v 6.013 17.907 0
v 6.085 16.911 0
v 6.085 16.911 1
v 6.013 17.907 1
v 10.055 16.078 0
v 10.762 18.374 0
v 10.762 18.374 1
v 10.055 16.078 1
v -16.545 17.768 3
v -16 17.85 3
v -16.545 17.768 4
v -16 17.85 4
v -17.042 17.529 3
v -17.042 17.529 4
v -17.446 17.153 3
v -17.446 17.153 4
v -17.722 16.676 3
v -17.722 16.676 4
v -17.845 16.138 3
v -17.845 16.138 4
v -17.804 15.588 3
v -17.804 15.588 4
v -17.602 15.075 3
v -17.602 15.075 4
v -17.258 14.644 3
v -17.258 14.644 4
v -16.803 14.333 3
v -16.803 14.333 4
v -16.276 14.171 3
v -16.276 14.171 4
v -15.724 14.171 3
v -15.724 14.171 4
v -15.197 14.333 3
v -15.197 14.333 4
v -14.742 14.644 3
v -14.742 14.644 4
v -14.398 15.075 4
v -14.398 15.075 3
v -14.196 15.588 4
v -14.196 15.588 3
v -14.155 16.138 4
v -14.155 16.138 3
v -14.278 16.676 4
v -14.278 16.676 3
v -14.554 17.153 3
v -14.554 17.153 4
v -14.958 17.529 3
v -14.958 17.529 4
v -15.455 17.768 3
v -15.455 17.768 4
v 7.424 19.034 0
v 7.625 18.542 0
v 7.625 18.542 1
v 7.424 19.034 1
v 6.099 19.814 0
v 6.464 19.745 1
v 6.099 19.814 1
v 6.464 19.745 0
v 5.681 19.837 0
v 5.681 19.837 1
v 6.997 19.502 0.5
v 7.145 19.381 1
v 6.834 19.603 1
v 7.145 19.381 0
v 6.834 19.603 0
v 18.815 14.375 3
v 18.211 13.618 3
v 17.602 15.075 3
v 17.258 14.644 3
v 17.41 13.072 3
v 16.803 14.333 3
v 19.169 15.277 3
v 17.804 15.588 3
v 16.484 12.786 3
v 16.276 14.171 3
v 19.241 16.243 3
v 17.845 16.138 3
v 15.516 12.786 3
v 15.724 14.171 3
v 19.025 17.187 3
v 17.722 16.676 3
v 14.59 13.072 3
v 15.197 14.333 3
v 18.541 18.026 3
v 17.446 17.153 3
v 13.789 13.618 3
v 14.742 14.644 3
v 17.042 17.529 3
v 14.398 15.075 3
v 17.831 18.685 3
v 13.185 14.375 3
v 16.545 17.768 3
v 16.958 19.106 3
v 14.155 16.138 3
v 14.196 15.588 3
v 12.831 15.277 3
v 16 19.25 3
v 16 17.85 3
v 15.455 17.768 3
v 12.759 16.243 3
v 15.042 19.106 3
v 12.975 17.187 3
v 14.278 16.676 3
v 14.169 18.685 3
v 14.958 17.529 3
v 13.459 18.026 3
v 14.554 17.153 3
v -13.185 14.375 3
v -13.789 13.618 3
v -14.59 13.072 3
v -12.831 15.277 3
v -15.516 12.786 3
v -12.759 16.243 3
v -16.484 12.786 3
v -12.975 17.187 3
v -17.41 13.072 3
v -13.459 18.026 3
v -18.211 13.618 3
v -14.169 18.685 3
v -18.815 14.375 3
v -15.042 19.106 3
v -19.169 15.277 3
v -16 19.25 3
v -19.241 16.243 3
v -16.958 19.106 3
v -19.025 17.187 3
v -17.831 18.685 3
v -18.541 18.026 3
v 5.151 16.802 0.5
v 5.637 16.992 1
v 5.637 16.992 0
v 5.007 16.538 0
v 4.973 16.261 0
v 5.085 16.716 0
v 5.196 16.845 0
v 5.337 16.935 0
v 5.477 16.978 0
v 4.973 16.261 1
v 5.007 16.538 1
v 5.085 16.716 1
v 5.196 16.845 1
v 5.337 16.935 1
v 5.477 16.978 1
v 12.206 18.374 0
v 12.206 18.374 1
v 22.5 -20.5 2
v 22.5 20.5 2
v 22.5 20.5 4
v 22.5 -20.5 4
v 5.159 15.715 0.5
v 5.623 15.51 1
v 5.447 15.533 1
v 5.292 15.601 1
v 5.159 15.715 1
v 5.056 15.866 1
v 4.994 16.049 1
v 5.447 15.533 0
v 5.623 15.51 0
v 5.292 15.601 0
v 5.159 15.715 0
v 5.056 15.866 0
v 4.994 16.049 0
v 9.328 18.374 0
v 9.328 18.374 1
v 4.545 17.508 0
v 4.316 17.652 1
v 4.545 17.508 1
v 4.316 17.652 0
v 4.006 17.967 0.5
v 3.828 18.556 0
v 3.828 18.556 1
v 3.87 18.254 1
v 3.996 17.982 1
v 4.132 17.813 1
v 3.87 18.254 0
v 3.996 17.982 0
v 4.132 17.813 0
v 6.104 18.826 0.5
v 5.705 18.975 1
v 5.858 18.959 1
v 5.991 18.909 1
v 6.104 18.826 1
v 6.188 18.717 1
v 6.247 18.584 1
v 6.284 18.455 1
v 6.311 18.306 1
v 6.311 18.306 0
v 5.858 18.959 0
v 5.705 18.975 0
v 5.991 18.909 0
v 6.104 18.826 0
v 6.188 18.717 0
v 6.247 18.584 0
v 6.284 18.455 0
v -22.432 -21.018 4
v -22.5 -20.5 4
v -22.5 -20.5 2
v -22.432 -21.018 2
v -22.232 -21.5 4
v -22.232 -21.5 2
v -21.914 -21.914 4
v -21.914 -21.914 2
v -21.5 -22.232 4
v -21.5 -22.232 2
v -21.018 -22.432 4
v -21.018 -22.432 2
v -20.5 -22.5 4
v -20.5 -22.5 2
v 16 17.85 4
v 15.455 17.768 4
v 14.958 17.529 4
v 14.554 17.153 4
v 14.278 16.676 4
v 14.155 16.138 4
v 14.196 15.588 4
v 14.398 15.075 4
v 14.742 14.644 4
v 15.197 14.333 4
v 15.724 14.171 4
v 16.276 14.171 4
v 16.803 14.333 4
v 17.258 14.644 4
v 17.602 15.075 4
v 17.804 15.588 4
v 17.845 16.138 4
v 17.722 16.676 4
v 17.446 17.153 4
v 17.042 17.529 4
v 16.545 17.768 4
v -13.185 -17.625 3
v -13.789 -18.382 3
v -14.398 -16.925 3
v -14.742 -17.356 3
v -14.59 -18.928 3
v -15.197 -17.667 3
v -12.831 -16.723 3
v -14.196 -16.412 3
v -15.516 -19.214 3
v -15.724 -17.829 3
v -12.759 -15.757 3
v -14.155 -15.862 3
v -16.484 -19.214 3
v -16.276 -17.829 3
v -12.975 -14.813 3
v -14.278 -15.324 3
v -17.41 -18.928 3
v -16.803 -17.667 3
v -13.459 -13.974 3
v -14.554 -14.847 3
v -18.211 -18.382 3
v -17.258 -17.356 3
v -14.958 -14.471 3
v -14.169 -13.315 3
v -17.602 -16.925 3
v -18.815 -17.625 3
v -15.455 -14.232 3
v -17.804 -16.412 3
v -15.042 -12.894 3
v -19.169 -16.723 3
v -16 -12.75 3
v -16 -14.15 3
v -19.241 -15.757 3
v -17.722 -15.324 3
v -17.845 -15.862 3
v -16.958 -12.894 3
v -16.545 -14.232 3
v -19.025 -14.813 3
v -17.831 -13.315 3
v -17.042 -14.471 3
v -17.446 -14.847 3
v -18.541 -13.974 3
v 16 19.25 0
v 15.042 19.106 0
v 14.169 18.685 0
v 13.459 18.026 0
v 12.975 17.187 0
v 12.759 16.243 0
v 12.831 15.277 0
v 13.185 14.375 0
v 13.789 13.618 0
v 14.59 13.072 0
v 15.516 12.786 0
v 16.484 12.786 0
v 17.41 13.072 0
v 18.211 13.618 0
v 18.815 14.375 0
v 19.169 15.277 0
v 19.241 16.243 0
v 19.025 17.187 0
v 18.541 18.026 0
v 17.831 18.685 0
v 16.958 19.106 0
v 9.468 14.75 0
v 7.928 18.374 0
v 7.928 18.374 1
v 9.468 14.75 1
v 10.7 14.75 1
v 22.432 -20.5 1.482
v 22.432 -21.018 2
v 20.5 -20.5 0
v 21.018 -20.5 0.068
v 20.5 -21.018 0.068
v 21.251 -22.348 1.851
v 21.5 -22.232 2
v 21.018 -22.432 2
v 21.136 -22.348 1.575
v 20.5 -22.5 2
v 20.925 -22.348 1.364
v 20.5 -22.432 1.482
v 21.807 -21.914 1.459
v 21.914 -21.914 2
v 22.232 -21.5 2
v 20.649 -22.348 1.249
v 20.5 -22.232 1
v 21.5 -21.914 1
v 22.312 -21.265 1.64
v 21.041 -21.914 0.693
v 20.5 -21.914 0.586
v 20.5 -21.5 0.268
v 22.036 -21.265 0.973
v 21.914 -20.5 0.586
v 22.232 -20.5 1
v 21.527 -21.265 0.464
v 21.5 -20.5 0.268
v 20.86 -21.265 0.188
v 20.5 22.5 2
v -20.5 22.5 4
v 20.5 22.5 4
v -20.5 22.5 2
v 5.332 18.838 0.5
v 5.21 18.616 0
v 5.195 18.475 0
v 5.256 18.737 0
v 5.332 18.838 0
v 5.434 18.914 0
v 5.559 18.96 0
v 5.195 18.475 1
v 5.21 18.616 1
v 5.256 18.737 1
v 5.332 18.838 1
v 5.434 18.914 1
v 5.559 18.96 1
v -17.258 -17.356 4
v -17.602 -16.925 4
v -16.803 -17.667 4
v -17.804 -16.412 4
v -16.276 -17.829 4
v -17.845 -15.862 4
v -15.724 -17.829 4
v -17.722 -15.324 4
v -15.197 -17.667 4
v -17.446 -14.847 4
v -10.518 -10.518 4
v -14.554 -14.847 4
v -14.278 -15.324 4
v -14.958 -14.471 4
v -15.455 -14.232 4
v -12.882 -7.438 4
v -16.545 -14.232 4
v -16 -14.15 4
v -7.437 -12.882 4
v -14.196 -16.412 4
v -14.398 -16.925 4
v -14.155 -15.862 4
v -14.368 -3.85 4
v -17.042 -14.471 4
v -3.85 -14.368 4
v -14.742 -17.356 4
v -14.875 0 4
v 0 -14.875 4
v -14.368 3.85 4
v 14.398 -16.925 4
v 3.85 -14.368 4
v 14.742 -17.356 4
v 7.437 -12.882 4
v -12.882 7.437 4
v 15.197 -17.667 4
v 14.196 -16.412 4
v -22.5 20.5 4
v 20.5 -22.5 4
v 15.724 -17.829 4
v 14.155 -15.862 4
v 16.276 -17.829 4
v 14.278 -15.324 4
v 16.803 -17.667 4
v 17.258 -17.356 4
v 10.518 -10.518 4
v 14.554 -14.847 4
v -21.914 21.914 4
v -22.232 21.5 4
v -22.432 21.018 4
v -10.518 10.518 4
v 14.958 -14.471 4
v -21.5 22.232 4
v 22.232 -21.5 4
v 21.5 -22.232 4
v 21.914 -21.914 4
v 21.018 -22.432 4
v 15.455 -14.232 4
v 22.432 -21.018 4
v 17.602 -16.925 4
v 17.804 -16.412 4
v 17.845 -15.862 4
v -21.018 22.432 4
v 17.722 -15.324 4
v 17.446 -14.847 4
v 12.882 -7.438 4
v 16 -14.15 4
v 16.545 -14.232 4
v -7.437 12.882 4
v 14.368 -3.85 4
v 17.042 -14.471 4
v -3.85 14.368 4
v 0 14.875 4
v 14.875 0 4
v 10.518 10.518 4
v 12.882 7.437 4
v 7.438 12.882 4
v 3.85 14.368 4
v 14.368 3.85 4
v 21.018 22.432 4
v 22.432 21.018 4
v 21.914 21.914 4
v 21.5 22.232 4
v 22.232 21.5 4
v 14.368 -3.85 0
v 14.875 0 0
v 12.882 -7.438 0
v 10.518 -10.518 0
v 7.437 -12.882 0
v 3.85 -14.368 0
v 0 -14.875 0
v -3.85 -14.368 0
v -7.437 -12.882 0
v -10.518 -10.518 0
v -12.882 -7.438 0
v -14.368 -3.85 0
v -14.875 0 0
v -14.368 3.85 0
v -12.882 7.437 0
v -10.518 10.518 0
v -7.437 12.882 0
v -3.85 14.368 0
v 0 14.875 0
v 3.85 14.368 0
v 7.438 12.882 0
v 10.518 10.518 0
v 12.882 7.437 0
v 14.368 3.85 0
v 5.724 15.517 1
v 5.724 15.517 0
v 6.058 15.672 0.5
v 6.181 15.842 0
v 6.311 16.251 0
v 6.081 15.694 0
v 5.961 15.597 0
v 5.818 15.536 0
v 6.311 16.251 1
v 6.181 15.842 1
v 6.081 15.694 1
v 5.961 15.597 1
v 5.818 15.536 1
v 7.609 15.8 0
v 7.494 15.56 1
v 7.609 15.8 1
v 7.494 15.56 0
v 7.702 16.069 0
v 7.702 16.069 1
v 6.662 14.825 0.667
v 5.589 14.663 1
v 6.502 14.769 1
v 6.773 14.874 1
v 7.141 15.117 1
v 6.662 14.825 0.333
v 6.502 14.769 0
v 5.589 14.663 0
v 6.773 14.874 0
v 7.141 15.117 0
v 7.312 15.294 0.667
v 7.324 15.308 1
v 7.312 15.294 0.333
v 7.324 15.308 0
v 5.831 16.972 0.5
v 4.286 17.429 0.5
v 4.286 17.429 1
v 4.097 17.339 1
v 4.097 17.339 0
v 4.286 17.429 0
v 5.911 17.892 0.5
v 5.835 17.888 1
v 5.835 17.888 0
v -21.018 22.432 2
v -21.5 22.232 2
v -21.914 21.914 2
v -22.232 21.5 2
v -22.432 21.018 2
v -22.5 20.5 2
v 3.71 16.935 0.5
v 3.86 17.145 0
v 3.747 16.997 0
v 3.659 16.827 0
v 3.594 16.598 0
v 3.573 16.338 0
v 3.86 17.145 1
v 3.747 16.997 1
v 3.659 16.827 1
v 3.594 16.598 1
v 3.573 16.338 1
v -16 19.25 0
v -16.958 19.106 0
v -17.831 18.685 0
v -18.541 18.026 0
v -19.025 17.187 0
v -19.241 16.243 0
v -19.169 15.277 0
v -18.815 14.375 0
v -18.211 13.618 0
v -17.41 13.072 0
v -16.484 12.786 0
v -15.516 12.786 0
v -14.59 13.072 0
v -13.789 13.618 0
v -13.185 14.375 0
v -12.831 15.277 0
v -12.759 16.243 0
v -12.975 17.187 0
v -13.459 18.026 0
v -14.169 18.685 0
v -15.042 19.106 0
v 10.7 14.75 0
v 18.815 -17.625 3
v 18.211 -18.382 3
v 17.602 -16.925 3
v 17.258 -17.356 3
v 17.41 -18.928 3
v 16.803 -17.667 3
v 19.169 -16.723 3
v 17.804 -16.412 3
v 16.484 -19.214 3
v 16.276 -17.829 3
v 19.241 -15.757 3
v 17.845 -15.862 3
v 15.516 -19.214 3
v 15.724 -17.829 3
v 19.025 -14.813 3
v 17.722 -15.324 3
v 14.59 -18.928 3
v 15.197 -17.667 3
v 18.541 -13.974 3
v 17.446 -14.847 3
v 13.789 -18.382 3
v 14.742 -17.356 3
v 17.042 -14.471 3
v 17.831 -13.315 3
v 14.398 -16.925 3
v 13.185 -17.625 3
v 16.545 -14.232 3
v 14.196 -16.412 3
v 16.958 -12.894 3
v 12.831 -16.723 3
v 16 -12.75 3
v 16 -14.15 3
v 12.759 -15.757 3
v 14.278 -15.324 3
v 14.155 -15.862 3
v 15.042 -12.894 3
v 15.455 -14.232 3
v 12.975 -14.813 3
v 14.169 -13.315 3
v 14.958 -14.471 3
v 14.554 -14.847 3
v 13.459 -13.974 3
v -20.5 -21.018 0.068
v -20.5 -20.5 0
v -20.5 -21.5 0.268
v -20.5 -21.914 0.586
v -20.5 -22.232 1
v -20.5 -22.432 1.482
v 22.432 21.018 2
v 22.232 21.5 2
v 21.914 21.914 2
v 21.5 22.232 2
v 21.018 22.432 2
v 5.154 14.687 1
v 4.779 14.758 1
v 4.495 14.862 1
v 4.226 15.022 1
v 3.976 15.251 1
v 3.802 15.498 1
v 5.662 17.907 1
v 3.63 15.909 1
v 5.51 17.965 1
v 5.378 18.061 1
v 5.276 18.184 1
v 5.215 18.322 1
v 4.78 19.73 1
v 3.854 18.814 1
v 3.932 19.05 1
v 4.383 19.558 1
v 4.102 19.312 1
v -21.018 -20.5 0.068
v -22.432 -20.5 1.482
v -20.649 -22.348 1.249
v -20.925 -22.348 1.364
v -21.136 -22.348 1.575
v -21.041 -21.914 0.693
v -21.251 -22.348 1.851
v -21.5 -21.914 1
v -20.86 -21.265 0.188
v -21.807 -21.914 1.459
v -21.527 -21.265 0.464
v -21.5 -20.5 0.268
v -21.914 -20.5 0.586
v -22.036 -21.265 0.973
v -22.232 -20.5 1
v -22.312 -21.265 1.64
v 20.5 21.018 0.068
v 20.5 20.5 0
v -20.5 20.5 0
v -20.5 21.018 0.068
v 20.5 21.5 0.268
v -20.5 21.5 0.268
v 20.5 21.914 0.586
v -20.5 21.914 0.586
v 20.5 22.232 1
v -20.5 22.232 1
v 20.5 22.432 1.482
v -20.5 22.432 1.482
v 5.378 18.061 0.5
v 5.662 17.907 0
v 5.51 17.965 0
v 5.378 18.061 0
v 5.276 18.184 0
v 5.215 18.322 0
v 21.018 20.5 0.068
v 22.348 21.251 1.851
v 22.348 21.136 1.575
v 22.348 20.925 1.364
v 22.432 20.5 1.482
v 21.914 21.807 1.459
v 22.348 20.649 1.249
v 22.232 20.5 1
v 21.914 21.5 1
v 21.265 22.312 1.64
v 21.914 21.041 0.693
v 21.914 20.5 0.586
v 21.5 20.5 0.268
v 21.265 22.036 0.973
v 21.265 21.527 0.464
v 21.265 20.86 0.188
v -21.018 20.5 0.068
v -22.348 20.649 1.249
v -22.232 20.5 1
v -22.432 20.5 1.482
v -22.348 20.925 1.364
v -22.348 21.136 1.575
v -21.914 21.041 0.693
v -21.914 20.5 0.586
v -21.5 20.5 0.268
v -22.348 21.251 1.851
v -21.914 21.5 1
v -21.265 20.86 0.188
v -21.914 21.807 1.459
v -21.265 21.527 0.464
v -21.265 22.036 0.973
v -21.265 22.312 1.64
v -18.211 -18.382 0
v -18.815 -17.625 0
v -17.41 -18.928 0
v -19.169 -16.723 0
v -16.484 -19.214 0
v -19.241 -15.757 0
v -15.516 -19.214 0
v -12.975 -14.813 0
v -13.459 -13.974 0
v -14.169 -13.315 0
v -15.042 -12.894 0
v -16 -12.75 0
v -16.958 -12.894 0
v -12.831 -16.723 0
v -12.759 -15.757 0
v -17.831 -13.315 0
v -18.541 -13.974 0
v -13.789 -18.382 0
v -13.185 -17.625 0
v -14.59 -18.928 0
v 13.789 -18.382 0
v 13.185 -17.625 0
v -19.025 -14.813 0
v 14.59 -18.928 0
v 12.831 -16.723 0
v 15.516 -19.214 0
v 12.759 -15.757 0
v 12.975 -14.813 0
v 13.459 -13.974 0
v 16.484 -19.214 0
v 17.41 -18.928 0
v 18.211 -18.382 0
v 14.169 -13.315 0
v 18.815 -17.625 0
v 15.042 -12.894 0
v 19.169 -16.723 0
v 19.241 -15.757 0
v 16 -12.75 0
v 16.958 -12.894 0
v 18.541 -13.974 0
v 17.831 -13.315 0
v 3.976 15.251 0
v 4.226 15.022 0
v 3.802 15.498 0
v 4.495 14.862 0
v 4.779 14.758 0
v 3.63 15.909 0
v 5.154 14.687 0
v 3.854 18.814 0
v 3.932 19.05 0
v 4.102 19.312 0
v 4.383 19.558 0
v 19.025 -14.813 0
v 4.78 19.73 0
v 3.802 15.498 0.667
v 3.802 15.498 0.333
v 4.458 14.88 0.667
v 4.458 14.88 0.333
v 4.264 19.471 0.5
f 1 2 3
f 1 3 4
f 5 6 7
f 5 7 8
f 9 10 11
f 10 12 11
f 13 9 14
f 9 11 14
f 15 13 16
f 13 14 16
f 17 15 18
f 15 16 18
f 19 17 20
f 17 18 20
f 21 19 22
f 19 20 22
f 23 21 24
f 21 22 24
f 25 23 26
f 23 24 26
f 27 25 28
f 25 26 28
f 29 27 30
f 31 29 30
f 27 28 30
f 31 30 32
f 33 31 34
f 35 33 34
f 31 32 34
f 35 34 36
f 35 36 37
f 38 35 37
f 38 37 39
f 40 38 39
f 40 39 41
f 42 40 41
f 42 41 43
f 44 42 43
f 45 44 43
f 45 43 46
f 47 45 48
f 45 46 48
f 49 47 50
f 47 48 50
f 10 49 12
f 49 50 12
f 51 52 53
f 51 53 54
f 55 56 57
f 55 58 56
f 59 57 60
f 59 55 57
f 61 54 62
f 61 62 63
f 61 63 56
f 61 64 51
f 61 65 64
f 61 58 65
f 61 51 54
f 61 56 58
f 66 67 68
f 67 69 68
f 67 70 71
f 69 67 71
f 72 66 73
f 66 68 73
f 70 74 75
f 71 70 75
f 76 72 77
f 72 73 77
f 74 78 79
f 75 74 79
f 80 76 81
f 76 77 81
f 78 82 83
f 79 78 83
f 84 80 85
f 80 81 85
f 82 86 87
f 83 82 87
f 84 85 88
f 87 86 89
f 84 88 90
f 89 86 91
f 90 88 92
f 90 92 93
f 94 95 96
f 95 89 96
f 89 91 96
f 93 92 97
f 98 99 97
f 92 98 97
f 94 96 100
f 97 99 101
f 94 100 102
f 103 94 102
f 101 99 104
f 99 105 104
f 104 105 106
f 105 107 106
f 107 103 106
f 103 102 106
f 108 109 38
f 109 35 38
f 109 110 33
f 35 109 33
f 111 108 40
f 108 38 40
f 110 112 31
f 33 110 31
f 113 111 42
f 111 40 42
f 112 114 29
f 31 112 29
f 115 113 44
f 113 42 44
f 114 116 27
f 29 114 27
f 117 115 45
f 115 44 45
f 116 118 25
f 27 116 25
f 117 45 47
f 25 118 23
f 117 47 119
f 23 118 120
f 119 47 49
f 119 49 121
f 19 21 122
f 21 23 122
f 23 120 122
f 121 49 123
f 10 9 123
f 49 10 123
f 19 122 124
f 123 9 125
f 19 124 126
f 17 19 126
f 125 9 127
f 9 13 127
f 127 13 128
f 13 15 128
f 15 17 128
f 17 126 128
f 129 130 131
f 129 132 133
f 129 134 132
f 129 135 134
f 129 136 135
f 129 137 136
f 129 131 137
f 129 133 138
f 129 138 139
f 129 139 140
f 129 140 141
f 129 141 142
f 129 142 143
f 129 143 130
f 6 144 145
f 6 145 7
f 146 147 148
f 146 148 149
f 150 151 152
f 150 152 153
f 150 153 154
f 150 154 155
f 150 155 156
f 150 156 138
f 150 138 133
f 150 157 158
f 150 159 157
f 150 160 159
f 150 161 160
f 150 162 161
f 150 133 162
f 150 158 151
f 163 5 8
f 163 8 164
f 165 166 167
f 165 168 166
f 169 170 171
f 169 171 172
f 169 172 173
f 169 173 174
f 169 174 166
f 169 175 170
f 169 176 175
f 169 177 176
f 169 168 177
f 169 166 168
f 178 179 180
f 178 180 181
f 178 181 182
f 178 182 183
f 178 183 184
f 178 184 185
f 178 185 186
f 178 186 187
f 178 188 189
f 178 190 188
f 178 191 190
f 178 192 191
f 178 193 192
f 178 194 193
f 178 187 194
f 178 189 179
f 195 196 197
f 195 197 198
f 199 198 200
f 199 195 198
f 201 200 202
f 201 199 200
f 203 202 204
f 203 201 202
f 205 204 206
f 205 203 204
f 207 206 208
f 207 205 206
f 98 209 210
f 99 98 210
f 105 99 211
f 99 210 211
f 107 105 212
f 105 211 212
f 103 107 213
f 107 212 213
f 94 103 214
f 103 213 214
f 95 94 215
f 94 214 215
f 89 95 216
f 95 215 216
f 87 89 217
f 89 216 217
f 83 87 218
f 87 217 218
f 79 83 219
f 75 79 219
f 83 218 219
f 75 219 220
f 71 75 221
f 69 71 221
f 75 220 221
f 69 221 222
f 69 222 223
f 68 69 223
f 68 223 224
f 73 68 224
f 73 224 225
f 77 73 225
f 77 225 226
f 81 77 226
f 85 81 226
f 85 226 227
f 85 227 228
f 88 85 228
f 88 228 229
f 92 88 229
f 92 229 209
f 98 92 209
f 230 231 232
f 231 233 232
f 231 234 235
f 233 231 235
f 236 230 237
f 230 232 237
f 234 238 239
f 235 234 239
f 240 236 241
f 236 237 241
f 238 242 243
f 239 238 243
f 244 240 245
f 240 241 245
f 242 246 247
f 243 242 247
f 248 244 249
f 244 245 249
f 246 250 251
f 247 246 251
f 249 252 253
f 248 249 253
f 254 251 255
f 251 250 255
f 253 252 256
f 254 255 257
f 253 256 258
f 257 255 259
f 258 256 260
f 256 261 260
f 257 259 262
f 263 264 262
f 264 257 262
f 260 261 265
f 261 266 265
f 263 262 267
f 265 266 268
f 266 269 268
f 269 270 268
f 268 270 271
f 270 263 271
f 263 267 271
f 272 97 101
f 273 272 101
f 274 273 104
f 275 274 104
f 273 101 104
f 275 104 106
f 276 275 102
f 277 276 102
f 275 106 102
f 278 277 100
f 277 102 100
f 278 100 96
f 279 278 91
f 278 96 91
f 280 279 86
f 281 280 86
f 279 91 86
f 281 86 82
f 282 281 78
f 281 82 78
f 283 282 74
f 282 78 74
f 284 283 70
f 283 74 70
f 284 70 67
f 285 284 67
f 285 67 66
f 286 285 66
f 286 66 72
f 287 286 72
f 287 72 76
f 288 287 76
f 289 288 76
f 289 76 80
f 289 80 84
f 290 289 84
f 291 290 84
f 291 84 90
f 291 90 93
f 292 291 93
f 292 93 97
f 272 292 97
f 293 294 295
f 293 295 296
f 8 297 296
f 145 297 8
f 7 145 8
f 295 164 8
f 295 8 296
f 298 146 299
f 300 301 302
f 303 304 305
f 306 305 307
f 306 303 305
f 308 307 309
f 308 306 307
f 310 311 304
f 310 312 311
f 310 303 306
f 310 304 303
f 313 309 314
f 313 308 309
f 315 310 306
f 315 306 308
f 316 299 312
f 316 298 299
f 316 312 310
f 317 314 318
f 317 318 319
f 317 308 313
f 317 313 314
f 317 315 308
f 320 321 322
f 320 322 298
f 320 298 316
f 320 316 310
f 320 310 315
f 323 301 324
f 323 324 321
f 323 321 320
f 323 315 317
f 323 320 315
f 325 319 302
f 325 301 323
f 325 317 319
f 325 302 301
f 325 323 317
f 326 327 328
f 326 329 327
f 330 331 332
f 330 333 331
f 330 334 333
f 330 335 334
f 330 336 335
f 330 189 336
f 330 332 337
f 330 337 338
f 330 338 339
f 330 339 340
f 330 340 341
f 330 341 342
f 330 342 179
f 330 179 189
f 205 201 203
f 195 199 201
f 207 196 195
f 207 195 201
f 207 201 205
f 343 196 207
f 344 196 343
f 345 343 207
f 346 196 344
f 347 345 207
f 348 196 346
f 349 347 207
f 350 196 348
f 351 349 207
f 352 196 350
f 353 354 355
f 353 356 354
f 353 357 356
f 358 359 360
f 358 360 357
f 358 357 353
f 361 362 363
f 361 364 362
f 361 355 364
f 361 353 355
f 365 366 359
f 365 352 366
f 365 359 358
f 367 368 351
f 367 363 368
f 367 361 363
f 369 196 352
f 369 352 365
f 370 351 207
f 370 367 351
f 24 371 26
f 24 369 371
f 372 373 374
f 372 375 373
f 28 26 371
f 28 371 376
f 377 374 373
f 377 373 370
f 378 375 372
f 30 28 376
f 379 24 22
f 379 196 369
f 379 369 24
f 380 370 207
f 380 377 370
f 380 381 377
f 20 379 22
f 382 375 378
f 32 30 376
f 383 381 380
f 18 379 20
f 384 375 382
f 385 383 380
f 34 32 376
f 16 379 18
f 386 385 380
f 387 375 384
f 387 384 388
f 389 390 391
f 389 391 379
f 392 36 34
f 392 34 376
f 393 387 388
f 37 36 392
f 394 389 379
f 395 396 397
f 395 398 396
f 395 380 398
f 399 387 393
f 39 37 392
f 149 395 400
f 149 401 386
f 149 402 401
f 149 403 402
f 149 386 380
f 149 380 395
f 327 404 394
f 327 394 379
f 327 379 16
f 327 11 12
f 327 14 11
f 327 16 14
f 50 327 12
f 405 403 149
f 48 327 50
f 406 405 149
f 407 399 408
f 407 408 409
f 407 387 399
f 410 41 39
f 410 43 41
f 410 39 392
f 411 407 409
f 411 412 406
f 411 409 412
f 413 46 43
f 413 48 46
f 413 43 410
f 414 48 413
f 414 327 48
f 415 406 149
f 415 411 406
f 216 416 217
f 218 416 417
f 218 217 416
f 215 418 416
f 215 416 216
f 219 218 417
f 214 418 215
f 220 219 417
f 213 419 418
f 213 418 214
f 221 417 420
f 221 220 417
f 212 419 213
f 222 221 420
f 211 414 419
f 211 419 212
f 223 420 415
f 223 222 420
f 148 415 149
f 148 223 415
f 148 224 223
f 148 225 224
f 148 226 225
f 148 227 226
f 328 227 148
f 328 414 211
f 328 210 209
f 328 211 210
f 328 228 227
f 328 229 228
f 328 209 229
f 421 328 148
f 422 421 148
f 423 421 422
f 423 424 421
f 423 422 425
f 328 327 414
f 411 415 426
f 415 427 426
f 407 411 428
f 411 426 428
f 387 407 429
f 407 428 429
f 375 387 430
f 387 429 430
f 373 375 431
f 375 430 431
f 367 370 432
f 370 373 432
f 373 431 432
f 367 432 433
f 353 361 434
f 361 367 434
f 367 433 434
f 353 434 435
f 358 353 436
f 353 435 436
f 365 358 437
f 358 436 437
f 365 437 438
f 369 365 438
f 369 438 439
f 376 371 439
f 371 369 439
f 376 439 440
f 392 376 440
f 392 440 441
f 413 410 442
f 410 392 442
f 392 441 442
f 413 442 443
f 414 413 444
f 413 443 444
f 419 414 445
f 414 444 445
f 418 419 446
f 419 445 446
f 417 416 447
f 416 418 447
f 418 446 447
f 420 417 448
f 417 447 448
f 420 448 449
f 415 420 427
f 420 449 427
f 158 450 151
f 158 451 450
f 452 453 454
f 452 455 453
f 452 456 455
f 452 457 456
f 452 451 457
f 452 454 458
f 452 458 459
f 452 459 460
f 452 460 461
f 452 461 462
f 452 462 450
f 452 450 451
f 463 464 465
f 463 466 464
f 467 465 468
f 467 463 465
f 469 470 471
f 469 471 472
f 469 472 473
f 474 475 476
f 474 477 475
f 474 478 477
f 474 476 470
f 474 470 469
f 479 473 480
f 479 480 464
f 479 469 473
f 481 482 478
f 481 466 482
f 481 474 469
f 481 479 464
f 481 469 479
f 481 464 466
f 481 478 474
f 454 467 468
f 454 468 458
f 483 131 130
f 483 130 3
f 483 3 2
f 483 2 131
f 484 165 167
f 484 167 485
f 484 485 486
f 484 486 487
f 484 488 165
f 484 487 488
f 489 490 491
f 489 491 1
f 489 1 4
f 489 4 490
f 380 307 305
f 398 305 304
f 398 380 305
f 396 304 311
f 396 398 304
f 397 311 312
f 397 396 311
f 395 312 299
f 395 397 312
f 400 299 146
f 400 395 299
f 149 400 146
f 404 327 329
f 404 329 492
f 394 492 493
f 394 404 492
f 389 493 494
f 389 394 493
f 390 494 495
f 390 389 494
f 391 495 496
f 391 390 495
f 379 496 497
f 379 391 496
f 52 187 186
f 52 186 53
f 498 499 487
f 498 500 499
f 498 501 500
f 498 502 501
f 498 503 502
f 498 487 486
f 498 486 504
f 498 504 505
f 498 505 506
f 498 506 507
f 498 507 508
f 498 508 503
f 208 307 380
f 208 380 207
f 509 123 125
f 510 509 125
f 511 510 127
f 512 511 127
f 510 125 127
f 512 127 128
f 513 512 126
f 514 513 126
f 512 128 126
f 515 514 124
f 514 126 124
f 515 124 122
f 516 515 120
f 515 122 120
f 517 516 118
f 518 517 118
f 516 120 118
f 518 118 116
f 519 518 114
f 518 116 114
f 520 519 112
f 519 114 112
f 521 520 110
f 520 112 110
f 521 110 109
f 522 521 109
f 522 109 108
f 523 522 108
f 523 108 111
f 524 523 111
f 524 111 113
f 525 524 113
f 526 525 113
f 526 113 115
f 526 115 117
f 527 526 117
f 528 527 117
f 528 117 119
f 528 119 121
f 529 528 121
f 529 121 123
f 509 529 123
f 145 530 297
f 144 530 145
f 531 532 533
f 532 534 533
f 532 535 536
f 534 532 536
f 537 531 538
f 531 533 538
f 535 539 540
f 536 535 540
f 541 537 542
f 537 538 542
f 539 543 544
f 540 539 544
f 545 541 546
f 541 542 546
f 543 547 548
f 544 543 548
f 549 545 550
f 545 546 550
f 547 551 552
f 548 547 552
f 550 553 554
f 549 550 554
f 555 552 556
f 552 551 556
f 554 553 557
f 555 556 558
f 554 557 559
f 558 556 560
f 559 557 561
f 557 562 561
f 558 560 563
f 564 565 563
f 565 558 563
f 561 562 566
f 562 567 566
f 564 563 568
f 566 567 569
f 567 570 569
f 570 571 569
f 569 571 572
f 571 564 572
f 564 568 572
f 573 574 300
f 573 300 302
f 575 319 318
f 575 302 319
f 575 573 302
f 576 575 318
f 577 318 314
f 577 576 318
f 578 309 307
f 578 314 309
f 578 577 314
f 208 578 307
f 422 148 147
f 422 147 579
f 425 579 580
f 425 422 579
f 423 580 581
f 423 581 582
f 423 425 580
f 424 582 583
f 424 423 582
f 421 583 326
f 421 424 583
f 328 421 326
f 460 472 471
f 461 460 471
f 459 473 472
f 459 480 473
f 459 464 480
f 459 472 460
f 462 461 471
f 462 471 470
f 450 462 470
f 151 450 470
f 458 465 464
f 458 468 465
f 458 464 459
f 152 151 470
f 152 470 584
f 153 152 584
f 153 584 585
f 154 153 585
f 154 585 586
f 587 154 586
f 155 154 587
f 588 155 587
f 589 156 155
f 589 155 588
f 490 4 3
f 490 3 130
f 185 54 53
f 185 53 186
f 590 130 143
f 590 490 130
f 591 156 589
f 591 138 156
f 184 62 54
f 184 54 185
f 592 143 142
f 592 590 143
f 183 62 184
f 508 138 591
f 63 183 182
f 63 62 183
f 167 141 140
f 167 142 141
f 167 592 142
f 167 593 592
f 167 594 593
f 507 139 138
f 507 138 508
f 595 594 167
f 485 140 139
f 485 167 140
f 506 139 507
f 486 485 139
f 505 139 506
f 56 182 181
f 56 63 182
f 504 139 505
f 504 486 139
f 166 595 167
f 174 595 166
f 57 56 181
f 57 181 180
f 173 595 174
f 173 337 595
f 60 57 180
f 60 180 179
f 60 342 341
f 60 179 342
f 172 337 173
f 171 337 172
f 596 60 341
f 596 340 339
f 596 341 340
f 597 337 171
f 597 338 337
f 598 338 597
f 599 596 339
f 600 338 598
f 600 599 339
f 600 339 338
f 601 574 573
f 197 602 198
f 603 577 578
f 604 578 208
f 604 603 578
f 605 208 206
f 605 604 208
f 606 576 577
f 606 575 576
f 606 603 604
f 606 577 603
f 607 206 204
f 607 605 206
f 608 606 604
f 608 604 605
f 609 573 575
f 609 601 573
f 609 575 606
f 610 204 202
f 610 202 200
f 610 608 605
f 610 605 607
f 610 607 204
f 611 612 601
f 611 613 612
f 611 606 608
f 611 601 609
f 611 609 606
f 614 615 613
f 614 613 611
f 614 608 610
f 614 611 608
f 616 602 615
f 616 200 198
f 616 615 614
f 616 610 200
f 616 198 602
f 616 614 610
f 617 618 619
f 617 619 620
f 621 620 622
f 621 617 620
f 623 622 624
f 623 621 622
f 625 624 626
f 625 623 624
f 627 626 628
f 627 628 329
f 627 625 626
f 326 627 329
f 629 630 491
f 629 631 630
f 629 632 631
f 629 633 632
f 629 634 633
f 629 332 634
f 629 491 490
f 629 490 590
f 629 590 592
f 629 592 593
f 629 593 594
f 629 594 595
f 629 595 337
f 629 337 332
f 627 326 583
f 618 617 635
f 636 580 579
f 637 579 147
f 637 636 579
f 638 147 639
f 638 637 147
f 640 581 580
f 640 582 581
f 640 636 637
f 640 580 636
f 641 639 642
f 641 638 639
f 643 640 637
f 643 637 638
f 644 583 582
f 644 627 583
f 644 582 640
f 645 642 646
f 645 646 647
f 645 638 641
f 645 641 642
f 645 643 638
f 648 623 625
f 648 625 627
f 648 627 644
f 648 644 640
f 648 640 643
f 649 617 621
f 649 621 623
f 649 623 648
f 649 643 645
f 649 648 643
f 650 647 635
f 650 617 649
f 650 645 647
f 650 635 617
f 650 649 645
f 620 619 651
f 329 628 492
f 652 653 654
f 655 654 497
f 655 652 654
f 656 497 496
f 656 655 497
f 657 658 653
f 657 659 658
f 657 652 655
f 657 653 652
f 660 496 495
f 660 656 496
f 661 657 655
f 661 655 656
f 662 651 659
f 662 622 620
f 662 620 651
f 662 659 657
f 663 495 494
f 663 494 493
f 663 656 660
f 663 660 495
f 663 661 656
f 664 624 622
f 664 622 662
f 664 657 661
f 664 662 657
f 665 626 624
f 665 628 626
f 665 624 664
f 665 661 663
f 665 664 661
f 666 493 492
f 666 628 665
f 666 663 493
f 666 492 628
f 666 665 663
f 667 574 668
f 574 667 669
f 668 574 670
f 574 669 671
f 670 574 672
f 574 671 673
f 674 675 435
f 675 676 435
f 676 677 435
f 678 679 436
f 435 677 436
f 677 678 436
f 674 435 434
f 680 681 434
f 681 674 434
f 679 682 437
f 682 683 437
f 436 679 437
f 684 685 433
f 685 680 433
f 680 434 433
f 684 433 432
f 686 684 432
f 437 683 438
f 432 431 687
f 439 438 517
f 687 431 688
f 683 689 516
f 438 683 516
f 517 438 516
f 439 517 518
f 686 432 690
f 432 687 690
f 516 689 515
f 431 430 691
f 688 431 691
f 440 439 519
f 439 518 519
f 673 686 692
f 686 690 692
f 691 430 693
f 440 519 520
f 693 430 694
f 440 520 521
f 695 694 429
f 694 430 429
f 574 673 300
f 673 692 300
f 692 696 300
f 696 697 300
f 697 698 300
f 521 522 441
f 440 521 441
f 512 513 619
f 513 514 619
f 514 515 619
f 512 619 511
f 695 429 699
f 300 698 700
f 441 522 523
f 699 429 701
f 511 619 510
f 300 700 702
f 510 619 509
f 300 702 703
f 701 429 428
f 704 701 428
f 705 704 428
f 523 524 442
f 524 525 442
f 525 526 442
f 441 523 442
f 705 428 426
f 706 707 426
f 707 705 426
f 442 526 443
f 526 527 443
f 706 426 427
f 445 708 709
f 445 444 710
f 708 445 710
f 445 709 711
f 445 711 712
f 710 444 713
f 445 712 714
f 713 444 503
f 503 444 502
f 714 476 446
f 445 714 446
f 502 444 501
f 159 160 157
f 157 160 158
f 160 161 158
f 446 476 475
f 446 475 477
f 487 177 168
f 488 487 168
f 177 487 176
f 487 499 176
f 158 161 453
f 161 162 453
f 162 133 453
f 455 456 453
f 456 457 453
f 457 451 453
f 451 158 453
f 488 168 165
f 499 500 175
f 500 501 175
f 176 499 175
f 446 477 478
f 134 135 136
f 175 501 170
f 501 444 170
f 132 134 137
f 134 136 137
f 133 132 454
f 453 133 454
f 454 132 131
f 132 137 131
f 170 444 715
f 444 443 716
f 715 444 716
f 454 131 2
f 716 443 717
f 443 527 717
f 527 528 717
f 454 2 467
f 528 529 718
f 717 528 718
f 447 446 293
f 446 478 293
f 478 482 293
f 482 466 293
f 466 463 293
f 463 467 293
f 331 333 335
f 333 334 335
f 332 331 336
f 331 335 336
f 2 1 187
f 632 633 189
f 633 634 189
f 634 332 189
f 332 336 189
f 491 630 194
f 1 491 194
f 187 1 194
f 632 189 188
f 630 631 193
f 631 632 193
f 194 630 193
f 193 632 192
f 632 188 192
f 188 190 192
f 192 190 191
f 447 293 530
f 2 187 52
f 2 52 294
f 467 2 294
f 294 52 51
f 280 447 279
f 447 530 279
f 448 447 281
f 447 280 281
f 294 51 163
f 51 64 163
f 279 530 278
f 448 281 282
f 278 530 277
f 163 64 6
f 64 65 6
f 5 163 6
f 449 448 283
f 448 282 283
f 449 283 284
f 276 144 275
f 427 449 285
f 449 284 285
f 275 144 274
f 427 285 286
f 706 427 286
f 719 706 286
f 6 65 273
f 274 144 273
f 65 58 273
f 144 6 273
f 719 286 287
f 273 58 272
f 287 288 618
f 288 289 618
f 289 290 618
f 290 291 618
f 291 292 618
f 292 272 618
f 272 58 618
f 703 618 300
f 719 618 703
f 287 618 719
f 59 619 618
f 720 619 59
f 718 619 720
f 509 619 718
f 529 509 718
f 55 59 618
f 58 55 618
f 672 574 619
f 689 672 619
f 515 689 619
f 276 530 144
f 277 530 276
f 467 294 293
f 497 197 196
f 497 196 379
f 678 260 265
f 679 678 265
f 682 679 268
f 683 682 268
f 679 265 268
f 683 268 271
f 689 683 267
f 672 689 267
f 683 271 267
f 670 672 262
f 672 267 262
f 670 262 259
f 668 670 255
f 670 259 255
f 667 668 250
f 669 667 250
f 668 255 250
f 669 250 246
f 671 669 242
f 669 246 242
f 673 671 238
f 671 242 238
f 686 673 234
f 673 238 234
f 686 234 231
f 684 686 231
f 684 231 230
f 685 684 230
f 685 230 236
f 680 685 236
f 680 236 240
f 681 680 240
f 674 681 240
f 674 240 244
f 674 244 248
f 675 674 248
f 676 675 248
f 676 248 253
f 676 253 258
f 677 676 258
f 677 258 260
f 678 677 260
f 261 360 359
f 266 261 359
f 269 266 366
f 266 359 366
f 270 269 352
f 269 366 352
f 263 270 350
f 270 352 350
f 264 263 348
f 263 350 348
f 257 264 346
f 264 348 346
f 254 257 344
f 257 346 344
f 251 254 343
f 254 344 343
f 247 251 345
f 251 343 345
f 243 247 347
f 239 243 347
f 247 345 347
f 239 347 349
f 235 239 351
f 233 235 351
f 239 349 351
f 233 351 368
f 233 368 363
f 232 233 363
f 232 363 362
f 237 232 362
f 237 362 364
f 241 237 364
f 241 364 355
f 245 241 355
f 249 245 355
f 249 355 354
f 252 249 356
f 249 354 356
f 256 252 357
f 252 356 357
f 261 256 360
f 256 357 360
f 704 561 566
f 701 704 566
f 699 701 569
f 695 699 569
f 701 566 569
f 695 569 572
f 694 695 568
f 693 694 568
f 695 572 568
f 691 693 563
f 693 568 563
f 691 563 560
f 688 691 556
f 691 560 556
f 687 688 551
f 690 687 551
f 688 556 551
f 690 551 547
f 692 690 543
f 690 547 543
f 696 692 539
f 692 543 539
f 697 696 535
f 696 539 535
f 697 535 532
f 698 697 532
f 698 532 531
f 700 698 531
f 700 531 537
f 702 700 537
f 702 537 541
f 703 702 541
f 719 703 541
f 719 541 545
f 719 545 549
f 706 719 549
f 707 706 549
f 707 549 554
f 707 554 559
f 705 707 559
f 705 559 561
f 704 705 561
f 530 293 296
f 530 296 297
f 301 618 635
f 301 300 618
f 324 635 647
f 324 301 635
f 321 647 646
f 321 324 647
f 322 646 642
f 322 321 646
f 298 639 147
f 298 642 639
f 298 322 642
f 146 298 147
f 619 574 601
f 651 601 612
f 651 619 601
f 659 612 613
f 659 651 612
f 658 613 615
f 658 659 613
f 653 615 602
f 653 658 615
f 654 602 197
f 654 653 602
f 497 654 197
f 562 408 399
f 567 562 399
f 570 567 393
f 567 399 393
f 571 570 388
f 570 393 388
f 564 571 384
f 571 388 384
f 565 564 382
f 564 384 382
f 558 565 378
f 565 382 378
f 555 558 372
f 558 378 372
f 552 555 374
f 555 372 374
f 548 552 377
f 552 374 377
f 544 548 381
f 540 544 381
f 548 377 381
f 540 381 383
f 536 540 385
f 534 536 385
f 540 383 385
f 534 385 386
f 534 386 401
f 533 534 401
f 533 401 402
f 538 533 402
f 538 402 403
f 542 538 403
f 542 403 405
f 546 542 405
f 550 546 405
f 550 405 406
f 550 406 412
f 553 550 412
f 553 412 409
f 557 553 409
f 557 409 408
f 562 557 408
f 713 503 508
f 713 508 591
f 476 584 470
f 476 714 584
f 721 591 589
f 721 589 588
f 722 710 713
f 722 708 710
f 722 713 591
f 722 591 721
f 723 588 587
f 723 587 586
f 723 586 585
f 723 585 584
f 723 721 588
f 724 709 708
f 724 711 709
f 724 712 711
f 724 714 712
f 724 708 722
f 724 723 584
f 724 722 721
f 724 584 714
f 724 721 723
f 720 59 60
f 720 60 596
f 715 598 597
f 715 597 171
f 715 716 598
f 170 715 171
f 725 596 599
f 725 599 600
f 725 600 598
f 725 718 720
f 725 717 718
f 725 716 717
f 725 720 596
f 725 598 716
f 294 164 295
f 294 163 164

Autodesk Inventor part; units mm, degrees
ref_plane "YZ Plane" through (0, 0, 0) normal (1, 0, 0) x (0, 1, 0)
ref_plane "XZ Plane" through (0, 0, 0) normal (0, 1, 0) x (-1, 0, 0)
ref_plane "XY Plane" through (0, 0, 0) normal (0, 0, 1) x (1, 0, 0)
sketch "Sketch1: base" plane through (0, 0, 0) normal (0, 0, 1) x (1, 0, 0)
  line L0 (-22.5, 22.5) -> (22.5, 22.5)
  line L1 (22.5, 22.5) -> (22.5, -22.5)
  line L2 (22.5, -22.5) -> (-22.5, -22.5)
  line L3 (-22.5, -22.5) -> (-22.5, 22.5)
  circle A0 centre (0, 0) radius 14.875
  line L4 (-16, 16) -> (16, 16) construction
  line L5 (16, 16) -> (16, -16) construction
  line L6 (16, -16) -> (-16, -16) construction
  line L7 (-16, -16) -> (-16, 16) construction
  circle A1 centre (16, 16) radius 1.8 construction
  circle A2 centre (16, 16) radius 3.25 construction
  point P0 (22.5, 0)
  point P1 (0, 22.5)
  point P2 (0, 16)
  point P3 (-16, 0)
  dimension "d0" = 29.75
  dimension "d1" = 45
  dimension "d4" = 32
  dimension "d19" = 6.5
  dimension "d20" = 3.6
  dimension "d21" = 6.5
extrude "Ex1: base" add sketch "Sketch1: base" along normal blind 4
hole "Hole1: M3 screws" at (-16, 16, 0) at (16, 16, 0) at (-16, -16, 0) at (16, -16, 0) direction (0, 0, 1) diameter 3.7 end through all counterbore diameter 6.5 counterbore depth 3 clearance for "Socket Head Cap Screw" size "M3" standard "Ansi Metric M Profile"
fillet "Fillet1" radius 2 8 edges at (0, 22.5, 0) (22.5, 0, 0) (22.5, 22.5, 2) (-22.5, 0, 0) (0, -22.5, 0) (22.5, -22.5, 2) (-22.5, -22.5, 2) (-22.5, 22.5, 2)
sketch "Sketch2: text" plane through (0, 0, 0) normal (0, 0, -1) x (-1, 0, 0)
  line L0 (-9.5, 19) -> (-6, 19) construction
  line L1 (-6, 19) -> (-6, 15.5) construction
  line L2 (-6, 15.5) -> (-9.5, 15.5) construction
  line L3 (-9.5, 15.5) -> (-9.5, 19) construction
  line L4 (22.5, 22.5) -> (-22.5, 22.5) construction
  line L5 (-22.5, 22.5) -> (-22.5, -22.5) construction
  line L6 (22.5, -22.5) -> (22.5, 22.5) construction
  line L7 (-22.5, -22.5) -> (22.5, -22.5) construction
  circle A0 centre (-16, 16) radius 3.25 construction
  circle A1 centre (-16, 16) radius 1.8 construction
  line L8 (16, 16) -> (-16, 16) construction
  circle A2 centre (0, 0) radius 14.875 construction
  circle A3 centre (0, 0) radius 14.875 construction
  line L9 (-12.2062, 18.3737) -> (-10.7625, 18.3737)
  line L10 (-10.7625, 18.3737) -> (-10.0551, 16.0782)
  line L11 (-10.0551, 16.0782) -> (-9.3284, 18.3737)
  line L12 (-9.3284, 18.3737) -> (-7.9281, 18.3737)
  line L13 (-7.9281, 18.3737) -> (-9.468, 14.75)
  line L14 (-9.468, 14.75) -> (-10.7, 14.75)
  line L15 (-10.7, 14.75) -> (-12.2062, 18.3737)
  line L16 (-6.3111, 18.3063) -> (-7.6249, 18.5421)
  spline S0 degree 2 poles (-7.6249, 18.5421) (-7.4613, 19.1677) (-6.5325, 19.8366) (-5.6807, 19.8366) knots 0 0 0 1 2 2 2
  spline S1 degree 2 poles (-5.6807, 19.8366) (-4.699, 19.8366) (-3.828, 19.1051) (-3.828, 18.5565) knots 0 0 0 1 2 2 2
  spline S2 degree 2 poles (-3.828, 18.5565) (-3.828, 18.2293) (-4.1841, 17.7048) (-4.545, 17.5075) knots 0 0 0 1 2 2 2
  spline S3 degree 2 poles (-4.545, 17.5075) (-4.2514, 17.4353) (-4.0974, 17.339) knots 0 0 0 1 1 1
  spline S4 degree 2 poles (-4.0974, 17.339) (-3.8472, 17.185) (-3.5729, 16.6846) (-3.5729, 16.3381) knots 0 0 0 1 2 2 2
  spline S5 degree 2 poles (-3.5729, 16.3381) (-3.5729, 15.9001) (-4.0301, 15.0965) (-4.8867, 14.6634) (-5.5893, 14.6634) knots 0 0 0 1 2 3 3 3
  spline S6 degree 2 poles (-5.5893, 14.6634) (-6.2678, 14.6634) (-7.057, 14.9858) (-7.5671, 15.6018) (-7.7019, 16.0686) knots 0 0 0 1 2 3 3 3
  line L17 (-7.7019, 16.0686) -> (-6.3111, 16.2514)
  spline S7 degree 2 poles (-6.3111, 16.2514) (-6.2293, 15.8328) (-5.8876, 15.5103) (-5.623, 15.5103) knots 0 0 0 1 2 2 2
  spline S8 degree 2 poles (-5.623, 15.5103) (-5.3438, 15.5103) (-4.9733, 15.9194) (-4.9733, 16.2611) knots 0 0 0 1 2 2 2
  spline S9 degree 2 poles (-4.9733, 16.2611) (-4.9733, 16.6124) (-5.3294, 16.9925) (-5.6374, 16.9925) knots 0 0 0 1 2 2 2
  spline S10 degree 2 poles (-5.6374, 16.9925) (-5.801, 16.9925) (-6.0849, 16.9107) knots 0 0 0 1 1 1
  line L18 (-6.0849, 16.9107) -> (-6.0128, 17.9069)
  spline S11 degree 2 poles (-6.0128, 17.9069) (-5.8973, 17.8876) (-5.8347, 17.8876) knots 0 0 0 1 1 1
  spline S12 degree 2 poles (-5.8347, 17.8876) (-5.5604, 17.8876) (-5.1947, 18.2341) (-5.1947, 18.4747) knots 0 0 0 1 2 2 2
  spline S13 degree 2 poles (-5.1947, 18.4747) (-5.1947, 18.7009) (-5.469, 18.9752) (-5.7048, 18.9752) knots 0 0 0 1 2 2 2
  spline S14 degree 2 poles (-5.7048, 18.9752) (-5.9502, 18.9752) (-6.2582, 18.6769) (-6.3111, 18.3063) knots 0 0 0 1 2 2 2
  point P0 (-7.75, 19)
  point P1 (0, 22.5)
  dimension "d23" = 3.5
  dimension "d24" = 3.5
  dimension "d29" = 13
extrude "Ex3: text" cut sketch "Sketch2: text" against normal blind 1
properties part number "cage_inside_03"
